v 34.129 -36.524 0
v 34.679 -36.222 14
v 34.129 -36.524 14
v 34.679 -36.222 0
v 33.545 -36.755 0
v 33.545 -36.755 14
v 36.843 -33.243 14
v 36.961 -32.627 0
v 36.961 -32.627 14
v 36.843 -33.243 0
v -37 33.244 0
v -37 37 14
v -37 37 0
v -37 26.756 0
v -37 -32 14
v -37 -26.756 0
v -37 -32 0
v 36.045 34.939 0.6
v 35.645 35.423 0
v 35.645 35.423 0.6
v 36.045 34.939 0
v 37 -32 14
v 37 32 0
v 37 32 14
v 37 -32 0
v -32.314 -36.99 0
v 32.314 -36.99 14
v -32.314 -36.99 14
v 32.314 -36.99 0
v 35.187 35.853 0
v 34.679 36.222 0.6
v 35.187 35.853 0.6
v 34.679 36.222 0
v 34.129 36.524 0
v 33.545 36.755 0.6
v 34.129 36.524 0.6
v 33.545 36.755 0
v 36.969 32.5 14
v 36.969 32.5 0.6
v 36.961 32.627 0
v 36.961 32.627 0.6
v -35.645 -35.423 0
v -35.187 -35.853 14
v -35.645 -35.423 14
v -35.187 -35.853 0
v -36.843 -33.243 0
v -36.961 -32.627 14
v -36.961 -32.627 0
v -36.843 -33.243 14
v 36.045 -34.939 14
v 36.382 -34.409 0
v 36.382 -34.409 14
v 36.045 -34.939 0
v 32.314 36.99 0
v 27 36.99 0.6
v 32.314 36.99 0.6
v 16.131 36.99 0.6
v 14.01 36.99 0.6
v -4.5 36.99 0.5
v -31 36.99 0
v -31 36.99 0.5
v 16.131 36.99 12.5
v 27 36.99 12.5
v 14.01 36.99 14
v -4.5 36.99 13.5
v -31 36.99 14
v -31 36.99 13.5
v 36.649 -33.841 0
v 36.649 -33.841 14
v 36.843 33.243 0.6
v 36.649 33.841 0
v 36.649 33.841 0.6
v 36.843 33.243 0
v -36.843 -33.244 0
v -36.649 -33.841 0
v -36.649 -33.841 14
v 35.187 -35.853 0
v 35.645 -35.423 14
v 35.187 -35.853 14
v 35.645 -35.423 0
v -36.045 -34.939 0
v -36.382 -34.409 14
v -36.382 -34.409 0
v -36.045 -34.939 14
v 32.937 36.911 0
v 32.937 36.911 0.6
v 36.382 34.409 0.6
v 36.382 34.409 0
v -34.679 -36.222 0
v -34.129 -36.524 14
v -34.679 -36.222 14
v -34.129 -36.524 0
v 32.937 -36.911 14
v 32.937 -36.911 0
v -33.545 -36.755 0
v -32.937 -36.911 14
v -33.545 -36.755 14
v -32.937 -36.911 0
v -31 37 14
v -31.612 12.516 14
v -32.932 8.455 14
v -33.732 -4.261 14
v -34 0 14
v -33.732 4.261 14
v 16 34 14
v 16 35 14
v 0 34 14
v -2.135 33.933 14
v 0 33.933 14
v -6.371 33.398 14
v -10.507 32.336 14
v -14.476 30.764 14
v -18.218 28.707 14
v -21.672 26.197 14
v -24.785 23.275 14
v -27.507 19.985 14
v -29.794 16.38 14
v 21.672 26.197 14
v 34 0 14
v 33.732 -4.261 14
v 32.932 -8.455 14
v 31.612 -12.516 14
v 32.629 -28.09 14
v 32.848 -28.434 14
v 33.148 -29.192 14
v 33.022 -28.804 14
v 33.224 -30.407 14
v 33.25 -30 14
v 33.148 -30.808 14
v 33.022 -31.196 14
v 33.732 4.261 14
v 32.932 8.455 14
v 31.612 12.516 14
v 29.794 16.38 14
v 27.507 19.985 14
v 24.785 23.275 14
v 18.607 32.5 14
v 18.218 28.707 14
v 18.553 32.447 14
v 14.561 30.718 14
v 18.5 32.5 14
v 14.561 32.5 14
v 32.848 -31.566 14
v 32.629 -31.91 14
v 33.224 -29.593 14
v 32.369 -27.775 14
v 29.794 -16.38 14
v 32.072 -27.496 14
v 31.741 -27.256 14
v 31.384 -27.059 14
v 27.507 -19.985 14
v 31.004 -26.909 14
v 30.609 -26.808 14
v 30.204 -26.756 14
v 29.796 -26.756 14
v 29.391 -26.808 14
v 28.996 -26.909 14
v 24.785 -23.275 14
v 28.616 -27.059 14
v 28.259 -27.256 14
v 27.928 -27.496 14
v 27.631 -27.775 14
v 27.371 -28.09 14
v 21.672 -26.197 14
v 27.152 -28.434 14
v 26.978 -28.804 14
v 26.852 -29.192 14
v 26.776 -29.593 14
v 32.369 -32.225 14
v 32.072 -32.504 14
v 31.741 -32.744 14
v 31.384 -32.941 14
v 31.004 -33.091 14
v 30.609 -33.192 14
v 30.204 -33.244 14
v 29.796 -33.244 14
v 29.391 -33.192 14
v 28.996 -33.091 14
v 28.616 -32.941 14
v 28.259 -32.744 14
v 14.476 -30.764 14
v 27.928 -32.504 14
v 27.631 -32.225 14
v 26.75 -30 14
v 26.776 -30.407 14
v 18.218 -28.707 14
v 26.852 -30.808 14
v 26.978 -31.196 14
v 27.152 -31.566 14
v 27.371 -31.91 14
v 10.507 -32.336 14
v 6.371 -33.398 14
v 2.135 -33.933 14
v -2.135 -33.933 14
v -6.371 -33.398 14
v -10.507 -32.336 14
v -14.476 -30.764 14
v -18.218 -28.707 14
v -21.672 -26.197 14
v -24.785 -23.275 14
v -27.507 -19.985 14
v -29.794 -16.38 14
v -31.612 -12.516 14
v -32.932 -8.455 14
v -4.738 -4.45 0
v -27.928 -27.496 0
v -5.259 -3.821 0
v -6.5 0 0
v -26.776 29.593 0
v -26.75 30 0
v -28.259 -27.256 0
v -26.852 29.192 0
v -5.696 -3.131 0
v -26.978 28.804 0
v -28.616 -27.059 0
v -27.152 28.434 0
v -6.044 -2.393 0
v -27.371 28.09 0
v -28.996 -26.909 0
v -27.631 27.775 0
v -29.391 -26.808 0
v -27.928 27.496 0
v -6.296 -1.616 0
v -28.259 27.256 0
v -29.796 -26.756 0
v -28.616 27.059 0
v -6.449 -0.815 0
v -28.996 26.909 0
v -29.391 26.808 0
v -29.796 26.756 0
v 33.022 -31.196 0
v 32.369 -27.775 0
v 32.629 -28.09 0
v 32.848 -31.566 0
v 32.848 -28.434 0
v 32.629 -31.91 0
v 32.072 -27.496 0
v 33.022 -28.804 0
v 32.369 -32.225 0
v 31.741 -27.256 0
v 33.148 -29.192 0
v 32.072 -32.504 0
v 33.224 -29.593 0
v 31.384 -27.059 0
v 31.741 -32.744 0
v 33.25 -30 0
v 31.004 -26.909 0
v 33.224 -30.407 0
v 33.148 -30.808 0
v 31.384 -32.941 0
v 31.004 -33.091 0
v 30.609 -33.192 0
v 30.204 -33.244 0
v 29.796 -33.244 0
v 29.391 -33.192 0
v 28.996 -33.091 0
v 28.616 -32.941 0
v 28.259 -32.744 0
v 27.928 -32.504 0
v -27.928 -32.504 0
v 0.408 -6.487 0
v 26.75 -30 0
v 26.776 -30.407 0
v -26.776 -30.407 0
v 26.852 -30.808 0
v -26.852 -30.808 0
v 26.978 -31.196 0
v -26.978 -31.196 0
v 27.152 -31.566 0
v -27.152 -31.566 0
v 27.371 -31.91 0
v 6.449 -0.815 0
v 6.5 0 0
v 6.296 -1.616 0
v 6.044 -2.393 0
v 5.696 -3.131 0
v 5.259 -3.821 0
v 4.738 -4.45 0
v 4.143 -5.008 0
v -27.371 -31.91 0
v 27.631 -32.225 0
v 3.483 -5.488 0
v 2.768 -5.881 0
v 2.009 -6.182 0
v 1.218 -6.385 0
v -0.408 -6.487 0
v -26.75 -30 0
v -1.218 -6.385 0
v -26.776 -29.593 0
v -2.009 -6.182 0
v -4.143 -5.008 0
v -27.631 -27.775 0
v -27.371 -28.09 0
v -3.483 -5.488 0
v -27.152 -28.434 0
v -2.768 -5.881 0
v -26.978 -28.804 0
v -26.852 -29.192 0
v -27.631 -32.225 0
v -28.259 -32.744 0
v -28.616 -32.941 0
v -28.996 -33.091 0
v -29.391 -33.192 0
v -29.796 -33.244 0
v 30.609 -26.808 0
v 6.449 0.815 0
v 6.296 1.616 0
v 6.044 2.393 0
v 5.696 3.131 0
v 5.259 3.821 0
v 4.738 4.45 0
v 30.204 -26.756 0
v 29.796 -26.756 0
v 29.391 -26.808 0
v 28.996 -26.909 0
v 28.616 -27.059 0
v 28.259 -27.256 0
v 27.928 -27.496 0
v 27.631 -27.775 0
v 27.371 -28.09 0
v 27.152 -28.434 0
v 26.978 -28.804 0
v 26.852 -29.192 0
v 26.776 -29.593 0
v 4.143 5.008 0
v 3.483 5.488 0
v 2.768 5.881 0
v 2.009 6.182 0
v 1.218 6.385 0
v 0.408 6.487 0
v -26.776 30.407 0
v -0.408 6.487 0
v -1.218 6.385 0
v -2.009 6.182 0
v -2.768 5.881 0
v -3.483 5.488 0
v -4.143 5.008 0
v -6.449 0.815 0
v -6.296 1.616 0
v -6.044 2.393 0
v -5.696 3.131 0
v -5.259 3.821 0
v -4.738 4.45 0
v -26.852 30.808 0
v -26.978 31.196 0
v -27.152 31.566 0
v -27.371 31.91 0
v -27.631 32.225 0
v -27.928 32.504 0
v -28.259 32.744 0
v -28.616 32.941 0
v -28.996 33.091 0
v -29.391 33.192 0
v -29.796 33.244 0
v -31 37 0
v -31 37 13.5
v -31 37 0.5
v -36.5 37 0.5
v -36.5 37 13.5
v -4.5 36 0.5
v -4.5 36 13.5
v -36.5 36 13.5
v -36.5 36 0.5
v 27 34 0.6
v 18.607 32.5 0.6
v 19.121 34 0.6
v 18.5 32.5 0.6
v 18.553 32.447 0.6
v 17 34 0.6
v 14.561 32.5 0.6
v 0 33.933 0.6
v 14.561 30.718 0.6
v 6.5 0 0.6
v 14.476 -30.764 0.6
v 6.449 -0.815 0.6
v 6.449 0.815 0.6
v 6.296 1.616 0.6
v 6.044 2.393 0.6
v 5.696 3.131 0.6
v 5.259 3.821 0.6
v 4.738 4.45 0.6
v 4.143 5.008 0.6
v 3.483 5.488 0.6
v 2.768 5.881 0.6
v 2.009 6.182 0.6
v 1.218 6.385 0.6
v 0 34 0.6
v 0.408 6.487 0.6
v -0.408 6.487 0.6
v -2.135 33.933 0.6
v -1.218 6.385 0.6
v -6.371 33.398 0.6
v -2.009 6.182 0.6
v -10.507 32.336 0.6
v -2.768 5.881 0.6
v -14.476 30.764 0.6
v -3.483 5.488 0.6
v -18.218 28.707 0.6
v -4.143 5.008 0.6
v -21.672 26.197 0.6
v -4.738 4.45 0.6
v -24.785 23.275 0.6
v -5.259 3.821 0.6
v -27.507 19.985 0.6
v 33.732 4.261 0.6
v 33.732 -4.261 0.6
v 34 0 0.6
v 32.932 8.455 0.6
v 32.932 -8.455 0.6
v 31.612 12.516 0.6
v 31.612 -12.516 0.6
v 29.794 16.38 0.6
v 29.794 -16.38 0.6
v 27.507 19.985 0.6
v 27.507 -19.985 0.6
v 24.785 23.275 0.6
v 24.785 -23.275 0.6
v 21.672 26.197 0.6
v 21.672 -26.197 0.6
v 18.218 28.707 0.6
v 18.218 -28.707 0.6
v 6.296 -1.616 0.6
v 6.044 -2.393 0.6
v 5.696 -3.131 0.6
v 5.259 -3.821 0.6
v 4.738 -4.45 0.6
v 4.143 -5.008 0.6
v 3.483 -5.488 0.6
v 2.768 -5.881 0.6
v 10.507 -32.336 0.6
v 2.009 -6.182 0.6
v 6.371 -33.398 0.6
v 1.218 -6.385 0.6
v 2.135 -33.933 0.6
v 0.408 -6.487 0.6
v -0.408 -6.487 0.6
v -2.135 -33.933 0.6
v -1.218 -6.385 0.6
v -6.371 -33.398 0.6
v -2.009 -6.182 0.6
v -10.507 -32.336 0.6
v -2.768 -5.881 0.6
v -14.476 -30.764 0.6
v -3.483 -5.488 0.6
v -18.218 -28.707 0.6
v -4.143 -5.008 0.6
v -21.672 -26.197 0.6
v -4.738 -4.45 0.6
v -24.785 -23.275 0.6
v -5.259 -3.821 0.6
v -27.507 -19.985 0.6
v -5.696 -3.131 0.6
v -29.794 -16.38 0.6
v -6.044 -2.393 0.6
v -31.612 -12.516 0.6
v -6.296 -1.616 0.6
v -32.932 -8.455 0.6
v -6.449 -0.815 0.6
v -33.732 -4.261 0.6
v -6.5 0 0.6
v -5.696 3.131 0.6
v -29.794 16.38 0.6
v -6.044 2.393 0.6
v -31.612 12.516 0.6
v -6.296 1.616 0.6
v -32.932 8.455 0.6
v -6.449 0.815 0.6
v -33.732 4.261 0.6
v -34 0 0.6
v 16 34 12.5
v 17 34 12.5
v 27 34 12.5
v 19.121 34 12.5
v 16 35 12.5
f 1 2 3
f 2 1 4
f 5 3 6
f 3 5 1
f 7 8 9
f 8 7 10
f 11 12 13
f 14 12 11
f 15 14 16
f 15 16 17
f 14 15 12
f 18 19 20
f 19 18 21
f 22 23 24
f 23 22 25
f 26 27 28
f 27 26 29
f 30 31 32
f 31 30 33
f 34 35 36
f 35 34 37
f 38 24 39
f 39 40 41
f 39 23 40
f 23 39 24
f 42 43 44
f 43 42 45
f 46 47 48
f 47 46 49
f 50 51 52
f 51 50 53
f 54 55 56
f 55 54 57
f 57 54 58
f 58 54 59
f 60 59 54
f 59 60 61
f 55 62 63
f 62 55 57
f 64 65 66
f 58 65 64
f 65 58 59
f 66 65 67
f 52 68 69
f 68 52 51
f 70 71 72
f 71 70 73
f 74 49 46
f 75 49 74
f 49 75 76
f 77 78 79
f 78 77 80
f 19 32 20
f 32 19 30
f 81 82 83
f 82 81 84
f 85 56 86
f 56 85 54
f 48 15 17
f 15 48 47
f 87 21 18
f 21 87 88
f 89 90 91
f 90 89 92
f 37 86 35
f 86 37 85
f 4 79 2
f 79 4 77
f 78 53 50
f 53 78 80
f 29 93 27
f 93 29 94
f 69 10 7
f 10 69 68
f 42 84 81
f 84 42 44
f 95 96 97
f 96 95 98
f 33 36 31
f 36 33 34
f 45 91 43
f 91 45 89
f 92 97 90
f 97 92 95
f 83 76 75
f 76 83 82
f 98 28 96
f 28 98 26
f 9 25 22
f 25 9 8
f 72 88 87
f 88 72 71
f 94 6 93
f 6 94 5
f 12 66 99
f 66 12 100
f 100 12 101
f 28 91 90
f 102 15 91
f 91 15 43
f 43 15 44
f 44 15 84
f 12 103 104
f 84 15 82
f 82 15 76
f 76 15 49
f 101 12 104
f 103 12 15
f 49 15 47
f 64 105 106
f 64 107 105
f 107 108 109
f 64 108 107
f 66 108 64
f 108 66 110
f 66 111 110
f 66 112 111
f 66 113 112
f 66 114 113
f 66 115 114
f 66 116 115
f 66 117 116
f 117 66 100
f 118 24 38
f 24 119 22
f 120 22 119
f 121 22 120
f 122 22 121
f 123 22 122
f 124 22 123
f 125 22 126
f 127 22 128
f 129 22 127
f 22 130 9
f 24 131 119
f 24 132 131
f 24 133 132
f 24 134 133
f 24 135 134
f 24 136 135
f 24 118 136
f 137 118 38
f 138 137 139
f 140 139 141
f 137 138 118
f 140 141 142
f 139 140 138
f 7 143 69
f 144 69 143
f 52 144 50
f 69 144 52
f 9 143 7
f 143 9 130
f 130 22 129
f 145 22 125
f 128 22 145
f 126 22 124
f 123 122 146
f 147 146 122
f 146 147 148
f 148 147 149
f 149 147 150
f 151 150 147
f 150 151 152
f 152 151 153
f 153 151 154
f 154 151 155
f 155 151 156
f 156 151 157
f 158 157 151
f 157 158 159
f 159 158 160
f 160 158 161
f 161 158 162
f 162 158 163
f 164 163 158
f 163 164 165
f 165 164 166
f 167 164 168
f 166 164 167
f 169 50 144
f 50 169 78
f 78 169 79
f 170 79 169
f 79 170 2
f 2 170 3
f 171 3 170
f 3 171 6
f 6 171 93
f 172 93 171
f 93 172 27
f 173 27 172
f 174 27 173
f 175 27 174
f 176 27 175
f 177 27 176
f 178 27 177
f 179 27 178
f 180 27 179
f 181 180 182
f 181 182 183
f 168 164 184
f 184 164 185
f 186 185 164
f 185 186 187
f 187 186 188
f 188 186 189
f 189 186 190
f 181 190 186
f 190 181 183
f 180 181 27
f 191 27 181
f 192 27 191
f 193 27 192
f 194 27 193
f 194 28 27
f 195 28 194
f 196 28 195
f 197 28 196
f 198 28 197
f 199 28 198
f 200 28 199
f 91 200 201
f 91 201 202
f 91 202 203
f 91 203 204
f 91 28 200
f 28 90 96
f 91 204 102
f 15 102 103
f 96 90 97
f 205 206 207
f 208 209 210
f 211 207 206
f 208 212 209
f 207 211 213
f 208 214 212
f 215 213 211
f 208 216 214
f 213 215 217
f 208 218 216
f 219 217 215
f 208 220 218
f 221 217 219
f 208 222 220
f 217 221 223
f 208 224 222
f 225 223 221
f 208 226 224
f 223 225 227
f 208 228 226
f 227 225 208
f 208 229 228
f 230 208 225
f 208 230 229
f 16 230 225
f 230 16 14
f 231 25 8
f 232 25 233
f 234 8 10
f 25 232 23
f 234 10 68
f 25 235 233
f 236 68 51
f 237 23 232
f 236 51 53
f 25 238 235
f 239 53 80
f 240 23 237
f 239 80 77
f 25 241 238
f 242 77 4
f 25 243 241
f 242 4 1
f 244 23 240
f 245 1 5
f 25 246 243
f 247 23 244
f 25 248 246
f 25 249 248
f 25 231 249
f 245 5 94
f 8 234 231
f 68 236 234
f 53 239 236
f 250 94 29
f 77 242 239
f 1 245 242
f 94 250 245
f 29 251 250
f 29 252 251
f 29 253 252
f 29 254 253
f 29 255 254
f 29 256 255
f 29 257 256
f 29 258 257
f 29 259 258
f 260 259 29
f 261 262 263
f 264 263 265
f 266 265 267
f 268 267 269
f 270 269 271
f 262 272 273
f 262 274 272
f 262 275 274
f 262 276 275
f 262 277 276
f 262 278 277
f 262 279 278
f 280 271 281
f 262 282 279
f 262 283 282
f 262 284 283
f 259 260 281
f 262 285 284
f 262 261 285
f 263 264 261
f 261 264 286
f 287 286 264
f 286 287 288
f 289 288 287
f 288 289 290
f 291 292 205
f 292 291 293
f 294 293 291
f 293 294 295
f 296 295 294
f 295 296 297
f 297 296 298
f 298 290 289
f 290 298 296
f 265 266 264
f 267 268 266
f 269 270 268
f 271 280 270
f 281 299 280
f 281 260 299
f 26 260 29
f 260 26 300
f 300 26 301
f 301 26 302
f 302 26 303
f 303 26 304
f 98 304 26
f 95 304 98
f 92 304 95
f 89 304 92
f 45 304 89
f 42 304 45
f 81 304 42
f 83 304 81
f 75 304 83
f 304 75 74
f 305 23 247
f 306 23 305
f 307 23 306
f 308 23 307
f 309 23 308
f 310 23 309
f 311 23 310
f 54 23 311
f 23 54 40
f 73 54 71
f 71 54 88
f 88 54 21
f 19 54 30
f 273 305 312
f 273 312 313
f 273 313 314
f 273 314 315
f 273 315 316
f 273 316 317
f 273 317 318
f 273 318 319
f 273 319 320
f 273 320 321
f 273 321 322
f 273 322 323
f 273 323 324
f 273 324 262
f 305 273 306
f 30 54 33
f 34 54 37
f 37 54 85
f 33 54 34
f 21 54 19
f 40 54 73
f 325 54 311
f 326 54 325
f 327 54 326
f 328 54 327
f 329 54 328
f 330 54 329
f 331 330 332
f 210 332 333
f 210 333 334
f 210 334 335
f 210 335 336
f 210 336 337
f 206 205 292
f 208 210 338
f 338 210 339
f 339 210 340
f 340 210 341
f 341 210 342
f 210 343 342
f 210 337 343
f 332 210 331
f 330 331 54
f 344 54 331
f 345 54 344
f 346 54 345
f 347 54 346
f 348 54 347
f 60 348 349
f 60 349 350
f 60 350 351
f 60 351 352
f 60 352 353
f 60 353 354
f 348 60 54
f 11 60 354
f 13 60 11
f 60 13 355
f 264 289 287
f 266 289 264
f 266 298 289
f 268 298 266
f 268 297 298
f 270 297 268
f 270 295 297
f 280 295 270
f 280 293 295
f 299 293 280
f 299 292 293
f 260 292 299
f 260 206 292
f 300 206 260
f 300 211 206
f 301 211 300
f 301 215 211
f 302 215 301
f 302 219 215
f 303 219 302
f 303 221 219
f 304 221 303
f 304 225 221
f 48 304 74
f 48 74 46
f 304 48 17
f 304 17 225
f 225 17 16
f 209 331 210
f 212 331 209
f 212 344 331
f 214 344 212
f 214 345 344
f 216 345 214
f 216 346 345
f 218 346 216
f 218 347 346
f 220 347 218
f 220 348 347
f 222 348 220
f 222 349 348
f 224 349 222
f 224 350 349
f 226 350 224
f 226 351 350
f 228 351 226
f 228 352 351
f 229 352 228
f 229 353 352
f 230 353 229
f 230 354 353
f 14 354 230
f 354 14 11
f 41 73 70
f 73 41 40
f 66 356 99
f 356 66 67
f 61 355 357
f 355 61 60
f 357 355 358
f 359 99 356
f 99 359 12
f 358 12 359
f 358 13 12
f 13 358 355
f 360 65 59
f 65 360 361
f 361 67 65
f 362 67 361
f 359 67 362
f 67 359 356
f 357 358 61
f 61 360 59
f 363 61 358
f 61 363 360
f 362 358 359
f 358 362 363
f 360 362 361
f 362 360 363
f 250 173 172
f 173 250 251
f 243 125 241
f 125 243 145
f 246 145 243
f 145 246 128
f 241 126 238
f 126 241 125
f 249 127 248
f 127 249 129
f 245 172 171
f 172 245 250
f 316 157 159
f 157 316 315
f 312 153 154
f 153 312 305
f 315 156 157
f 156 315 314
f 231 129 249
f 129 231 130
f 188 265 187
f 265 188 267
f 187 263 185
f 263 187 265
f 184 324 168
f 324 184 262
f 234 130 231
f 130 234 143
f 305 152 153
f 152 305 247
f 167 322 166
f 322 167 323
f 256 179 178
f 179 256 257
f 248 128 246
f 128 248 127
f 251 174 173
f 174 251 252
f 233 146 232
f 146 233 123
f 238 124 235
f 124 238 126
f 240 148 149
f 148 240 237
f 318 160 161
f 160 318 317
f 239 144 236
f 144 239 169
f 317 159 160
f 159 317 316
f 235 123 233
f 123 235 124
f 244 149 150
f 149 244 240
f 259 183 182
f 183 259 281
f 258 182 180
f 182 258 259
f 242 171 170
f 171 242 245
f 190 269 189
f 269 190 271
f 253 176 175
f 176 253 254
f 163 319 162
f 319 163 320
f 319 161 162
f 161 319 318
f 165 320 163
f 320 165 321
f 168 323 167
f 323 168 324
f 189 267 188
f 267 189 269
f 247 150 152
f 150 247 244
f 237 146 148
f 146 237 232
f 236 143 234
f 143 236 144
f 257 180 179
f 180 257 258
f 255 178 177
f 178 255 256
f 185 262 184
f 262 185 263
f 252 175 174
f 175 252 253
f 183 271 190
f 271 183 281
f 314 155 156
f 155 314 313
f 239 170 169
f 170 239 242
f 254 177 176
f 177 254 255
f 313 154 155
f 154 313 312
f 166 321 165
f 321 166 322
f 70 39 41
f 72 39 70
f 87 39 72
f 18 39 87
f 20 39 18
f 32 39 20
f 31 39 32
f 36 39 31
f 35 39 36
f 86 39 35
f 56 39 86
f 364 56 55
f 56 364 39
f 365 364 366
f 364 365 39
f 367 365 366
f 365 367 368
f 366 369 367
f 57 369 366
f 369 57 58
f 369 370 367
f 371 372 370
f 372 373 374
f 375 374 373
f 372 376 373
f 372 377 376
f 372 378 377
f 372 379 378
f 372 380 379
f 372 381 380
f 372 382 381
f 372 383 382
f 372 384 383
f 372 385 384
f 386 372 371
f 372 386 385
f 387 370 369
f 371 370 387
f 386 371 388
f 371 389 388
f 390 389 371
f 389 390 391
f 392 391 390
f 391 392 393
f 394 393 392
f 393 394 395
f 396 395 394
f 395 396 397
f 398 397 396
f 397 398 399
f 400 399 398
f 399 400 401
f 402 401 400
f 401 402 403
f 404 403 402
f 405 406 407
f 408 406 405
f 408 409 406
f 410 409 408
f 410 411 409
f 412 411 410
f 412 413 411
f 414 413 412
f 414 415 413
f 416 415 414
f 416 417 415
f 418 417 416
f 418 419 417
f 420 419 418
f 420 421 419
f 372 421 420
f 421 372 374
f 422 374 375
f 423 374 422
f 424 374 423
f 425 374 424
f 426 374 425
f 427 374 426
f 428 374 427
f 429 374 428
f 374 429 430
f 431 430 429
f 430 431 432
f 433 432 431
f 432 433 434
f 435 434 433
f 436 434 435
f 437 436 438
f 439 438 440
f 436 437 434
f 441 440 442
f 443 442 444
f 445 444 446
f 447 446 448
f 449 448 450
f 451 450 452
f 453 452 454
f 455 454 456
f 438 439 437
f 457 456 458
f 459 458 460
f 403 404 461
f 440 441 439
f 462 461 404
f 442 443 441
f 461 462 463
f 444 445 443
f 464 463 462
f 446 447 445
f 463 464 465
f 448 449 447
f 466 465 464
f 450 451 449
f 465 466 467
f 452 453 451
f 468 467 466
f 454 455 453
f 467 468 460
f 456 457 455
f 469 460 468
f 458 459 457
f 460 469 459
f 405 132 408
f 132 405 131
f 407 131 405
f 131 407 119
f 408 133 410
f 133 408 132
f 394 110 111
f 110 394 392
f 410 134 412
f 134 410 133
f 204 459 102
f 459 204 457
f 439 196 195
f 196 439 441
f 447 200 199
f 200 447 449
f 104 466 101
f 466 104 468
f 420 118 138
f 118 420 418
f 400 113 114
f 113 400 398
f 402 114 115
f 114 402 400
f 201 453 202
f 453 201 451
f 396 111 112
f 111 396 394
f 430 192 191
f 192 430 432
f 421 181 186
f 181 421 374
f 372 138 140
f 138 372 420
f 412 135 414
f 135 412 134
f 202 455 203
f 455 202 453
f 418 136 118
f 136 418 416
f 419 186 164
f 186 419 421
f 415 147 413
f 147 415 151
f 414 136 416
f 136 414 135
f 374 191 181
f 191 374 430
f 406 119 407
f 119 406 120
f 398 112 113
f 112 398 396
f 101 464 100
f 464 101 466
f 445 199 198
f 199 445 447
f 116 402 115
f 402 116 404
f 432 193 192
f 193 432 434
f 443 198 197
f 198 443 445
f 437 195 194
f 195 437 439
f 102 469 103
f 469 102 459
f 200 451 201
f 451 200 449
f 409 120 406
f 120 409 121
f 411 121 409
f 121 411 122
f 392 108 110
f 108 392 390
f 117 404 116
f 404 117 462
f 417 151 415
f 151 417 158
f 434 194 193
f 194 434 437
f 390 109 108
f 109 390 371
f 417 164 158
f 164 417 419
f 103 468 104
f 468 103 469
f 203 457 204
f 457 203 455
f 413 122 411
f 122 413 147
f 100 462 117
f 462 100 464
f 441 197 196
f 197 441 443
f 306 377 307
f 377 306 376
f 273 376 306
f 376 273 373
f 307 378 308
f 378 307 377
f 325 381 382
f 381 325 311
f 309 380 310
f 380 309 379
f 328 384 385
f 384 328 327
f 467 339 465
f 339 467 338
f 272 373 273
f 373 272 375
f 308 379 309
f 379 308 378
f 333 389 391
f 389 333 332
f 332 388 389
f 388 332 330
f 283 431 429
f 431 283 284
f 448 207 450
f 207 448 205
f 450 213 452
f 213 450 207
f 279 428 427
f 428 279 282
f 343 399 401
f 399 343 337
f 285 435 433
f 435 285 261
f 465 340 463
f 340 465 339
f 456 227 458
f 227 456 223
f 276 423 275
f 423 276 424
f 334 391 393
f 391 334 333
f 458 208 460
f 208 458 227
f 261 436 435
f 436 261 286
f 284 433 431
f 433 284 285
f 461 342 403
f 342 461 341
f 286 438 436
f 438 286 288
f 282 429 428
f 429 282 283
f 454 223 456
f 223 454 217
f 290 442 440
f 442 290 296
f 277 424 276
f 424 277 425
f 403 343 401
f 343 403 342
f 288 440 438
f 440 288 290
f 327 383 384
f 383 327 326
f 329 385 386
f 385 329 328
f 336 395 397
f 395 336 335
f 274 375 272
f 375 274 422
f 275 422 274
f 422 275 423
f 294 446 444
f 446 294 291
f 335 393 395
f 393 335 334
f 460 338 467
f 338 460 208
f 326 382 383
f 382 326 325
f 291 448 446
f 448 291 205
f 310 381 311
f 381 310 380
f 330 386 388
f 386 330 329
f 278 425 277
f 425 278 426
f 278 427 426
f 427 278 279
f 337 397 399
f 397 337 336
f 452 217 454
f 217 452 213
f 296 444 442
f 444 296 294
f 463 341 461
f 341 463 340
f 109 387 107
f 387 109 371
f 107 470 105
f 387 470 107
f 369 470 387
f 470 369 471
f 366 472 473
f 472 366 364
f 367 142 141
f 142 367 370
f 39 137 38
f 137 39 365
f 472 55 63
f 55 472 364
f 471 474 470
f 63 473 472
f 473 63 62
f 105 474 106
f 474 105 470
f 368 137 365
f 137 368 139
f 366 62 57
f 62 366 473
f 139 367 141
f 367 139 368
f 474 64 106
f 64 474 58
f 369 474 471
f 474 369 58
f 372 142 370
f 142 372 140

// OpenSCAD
$fn = 50;


difference() {
	union() {
		hull() {
			translate(v = [-32.0000000000, 32.0000000000, 0]) {
				cylinder(h = 14, r = 5);
			}
			translate(v = [32.0000000000, 32.0000000000, 0]) {
				cylinder(h = 14, r = 5);
			}
			translate(v = [-32.0000000000, -32.0000000000, 0]) {
				cylinder(h = 14, r = 5);
			}
			translate(v = [32.0000000000, -32.0000000000, 0]) {
				cylinder(h = 14, r = 5);
			}
		}
		translate(v = [-37.0000000000, 31.0000000000, 0]) {
			cube(size = [6, 6, 14]);
		}
	}
	union() {
		translate(v = [-37.5000000000, -30.0000000000, -250.0000000000]) {
			rotate(a = [0, 0, 0]) {
				difference() {
					union() {
						hull() {
							translate(v = [7.5000000000, 0, 0]) {
								cylinder(h = 250, r = 3.2500000000, r1 = 3.2500000000, r2 = 3.2500000000);
							}
							translate(v = [-7.5000000000, 0, 0]) {
								cylinder(h = 250, r = 3.2500000000, r1 = 3.2500000000, r2 = 3.2500000000);
							}
						}
					}
					union();
				}
			}
		}
		translate(v = [-37.5000000000, 30.0000000000, -250.0000000000]) {
			rotate(a = [0, 0, 0]) {
				difference() {
					union() {
						hull() {
							translate(v = [7.5000000000, 0, 0]) {
								cylinder(h = 250, r = 3.2500000000, r1 = 3.2500000000, r2 = 3.2500000000);
							}
							translate(v = [-7.5000000000, 0, 0]) {
								cylinder(h = 250, r = 3.2500000000, r1 = 3.2500000000, r2 = 3.2500000000);
							}
						}
					}
					union();
				}
			}
		}
		translate(v = [-36.5000000000, 36.0000000000, 0.5000000000]) {
			cube(size = [32, 1, 13.0000000000]);
		}
		translate(v = [30.0000000000, -30.0000000000, -50.0000000000]) {
			cylinder(h = 100, r = 3.2500000000);
		}
		translate(v = [0, 0, 0.6000000000]) {
			cylinder(h = 16.4000000000, r = 34.0000000000);
		}
		translate(v = [0, 0, -7.0000000000]) {
			cylinder(h = 14, r = 6.5000000000);
		}
		translate(v = [0.0000000000, 32.5000000000, 0.6000000000]) {
			cube(size = [37.0000000000, 1.5000000000, 16.4000000000]);
		}
		translate(v = [27.0000000000, 32.5000000000, 0.6000000000]) {
			cube(size = [10, 4.5000000000, 16.4000000000]);
		}
		translate(v = [16.0000000000, 32.5000000000, 12.5000000000]) {
			cube(size = [21, 4.5000000000, 1.5000000000]);
		}
		translate(v = [13.2500000000, 37.7500000000, 0.6000000000]) {
			rotate(a = [0, 0, -45]) {
				cube(size = [7.5000000000, 1.5000000000, 16.4000000000]);
			}
		}
		translate(v = [7.0610000000, 30.5000000000, 0.6000000000]) {
			cube(size = [7.5000000000, 2, 13.4000000000]);
		}
	}
}
